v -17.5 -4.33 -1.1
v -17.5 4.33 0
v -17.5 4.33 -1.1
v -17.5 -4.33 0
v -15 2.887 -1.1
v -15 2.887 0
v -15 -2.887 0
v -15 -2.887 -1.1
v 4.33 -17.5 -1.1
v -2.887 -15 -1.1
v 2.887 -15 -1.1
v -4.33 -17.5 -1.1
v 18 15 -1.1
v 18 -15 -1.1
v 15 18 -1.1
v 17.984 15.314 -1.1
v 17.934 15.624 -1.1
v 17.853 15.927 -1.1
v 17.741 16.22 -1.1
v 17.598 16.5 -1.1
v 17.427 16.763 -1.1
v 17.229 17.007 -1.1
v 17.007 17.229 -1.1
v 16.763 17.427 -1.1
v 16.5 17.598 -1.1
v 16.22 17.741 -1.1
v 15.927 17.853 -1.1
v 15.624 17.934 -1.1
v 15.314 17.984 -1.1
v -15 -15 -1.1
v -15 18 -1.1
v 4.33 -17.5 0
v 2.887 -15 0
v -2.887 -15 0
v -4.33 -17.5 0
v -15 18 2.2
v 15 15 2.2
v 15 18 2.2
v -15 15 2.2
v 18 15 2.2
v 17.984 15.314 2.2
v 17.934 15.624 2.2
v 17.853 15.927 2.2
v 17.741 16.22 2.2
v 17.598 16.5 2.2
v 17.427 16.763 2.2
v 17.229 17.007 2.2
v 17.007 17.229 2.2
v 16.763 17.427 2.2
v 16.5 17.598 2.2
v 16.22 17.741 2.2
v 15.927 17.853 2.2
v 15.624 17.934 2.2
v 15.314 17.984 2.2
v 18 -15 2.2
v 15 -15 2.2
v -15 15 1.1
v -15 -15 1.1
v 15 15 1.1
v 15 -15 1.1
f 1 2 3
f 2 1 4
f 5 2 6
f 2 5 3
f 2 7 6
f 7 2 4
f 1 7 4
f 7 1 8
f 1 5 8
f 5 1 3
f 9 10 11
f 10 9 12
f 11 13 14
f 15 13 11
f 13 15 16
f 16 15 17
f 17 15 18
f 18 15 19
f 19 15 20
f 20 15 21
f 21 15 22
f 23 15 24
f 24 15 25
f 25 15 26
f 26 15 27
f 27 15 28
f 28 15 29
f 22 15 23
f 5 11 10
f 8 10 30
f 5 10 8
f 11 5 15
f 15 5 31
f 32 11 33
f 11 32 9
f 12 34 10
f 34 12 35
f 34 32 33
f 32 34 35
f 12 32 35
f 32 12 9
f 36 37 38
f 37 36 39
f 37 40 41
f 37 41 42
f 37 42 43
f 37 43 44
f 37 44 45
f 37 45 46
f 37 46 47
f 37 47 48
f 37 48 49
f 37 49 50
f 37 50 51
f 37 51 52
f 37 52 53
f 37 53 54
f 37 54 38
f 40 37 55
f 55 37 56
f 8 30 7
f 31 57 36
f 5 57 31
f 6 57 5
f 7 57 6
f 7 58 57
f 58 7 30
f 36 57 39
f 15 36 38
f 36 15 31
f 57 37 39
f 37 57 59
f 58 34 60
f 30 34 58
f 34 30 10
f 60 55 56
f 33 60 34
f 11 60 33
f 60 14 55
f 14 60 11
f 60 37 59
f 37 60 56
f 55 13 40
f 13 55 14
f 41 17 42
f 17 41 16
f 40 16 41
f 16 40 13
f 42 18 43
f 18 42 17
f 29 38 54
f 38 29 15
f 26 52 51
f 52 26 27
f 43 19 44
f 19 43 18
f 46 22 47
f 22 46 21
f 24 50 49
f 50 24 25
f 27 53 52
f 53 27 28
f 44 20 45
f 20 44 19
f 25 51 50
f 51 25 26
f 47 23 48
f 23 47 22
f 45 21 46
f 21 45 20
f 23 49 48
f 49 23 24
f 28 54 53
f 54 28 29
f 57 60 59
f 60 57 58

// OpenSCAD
side=30;
//thickness of the board
thick=2.2;
edge_thick=3;
//coefficient of the thickness of the board
edge_height_coef=1.5;//[1:0.1:3]

// printer tolerance (only affect "color 02" parts)
tolerance=0.3;//[0:0.05:0.7]
// definition (only affect corners)
$fn=60;
// [Corner color 01,Corner color 02,Edge color 01,Edge color 02,Center color 01,Center color 02,Test part]
render="Corner color 01";

////////
module slot() {
translate([-side/2,0,-thick/2-0.2]) rotate([0,0,180]) translate([0.2,0,0]) hull() {for(i=[-1,1]) translate([-0.5-2*tolerance/1.75,i*(0.866+2*tolerance),0]) cylinder(d=8,h=thick/2+0.5,$fn=3);}
}
module couleur01(a) {
    cube([side,side,thick],center=true);
    for(i=[0,90]) rotate([0,0,i])
    translate([-side/2,0,-thick/2]) cylinder(d=10,h=thick/2,$fn=3);
    if (a==2) {
        for(i=[0,-90]) rotate([0,0,i])
        translate([-side/2,side/2,-thick/2]) cube([side,edge_thick,edge_height_coef*thick]);
        difference() {
            translate([side/2,side/2,-thick/2]) cylinder(r=edge_thick,h=edge_height_coef*thick);
            cube([side,side,2*edge_height_coef*thick],center=true);
        }
    }
    if (a==3) {
        rotate([0,0,180])
        translate([-side/2,0,-thick/2]) cylinder(d=10,h=thick/2,$fn=3);
        translate([-side/2,side/2,-thick/2]) cube([side,edge_thick,edge_height_coef*thick]);
    }
    else if (a==4) {
        for(i=[180,-90]) rotate([0,0,i])
        translate([-side/2,0,-thick/2]) cylinder(d=10,h=thick/2,$fn=3);
    }
    else {};
}

module couleur02(a) {
    difference() {
        cube([side,side,thick],center=true);
        for(i=[0,90]) rotate([0,0,i])
        slot();
        if (a==3) {
            rotate([0,0,180]) slot();
        }
        else if (a==4) {
            for(i=[180,-90]) rotate([0,0,i]) slot();
        }
        else {};
    }
    if (a==2) {
        for(i=[0,-90]) rotate([0,0,i])
        translate([-side/2,side/2,-thick/2]) cube([side,edge_thick,edge_height_coef*thick]);
        difference() {
            translate([side/2,side/2,-thick/2]) cylinder(r=edge_thick,h=edge_height_coef*thick);
            cube([side,side,2*edge_height_coef*thick],center=true);
        }
    }
    if (a==3) {
        translate([-side/2,side/2,-thick/2]) cube([side,edge_thick,edge_height_coef*thick]);
    }
}

if (render=="Corner color 01") {
    couleur01(2);
}
else if (render=="Corner color 02") {
    couleur02(2);
}
else if (render=="Edge color 01") {
    couleur01(3);
}
else if (render=="Edge color 02") {
    couleur02(3);
}
else if (render=="Center color 01") {
    couleur01(4);
}
else if (render=="Center color 02") {
    couleur02(4);
}
else if (render=="Test part") {
    rotate([0,0,180]) translate([-1.5,0,0]) difference() {
        translate([-7.5,0,0]) cube([15,15,thick],center=true);
        translate([-30/2,0,-thick/2-0.2]) rotate([0,0,180]) translate([0.2,0,0]) hull() {for(i=[-1,1]) translate([-0.5-2*tolerance/1.75,i*(0.866+2*tolerance),0]) cylinder(d=8,h=thick/2+0.5,$fn=3);}
    }
    translate([-1.5,0,0]) union() {
        translate([-7.5,0,0]) cube([15,15,thick],center=true);
        translate([-30/2,0,-thick/2]) cylinder(d=10,h=thick/2,$fn=3);
    }
}
